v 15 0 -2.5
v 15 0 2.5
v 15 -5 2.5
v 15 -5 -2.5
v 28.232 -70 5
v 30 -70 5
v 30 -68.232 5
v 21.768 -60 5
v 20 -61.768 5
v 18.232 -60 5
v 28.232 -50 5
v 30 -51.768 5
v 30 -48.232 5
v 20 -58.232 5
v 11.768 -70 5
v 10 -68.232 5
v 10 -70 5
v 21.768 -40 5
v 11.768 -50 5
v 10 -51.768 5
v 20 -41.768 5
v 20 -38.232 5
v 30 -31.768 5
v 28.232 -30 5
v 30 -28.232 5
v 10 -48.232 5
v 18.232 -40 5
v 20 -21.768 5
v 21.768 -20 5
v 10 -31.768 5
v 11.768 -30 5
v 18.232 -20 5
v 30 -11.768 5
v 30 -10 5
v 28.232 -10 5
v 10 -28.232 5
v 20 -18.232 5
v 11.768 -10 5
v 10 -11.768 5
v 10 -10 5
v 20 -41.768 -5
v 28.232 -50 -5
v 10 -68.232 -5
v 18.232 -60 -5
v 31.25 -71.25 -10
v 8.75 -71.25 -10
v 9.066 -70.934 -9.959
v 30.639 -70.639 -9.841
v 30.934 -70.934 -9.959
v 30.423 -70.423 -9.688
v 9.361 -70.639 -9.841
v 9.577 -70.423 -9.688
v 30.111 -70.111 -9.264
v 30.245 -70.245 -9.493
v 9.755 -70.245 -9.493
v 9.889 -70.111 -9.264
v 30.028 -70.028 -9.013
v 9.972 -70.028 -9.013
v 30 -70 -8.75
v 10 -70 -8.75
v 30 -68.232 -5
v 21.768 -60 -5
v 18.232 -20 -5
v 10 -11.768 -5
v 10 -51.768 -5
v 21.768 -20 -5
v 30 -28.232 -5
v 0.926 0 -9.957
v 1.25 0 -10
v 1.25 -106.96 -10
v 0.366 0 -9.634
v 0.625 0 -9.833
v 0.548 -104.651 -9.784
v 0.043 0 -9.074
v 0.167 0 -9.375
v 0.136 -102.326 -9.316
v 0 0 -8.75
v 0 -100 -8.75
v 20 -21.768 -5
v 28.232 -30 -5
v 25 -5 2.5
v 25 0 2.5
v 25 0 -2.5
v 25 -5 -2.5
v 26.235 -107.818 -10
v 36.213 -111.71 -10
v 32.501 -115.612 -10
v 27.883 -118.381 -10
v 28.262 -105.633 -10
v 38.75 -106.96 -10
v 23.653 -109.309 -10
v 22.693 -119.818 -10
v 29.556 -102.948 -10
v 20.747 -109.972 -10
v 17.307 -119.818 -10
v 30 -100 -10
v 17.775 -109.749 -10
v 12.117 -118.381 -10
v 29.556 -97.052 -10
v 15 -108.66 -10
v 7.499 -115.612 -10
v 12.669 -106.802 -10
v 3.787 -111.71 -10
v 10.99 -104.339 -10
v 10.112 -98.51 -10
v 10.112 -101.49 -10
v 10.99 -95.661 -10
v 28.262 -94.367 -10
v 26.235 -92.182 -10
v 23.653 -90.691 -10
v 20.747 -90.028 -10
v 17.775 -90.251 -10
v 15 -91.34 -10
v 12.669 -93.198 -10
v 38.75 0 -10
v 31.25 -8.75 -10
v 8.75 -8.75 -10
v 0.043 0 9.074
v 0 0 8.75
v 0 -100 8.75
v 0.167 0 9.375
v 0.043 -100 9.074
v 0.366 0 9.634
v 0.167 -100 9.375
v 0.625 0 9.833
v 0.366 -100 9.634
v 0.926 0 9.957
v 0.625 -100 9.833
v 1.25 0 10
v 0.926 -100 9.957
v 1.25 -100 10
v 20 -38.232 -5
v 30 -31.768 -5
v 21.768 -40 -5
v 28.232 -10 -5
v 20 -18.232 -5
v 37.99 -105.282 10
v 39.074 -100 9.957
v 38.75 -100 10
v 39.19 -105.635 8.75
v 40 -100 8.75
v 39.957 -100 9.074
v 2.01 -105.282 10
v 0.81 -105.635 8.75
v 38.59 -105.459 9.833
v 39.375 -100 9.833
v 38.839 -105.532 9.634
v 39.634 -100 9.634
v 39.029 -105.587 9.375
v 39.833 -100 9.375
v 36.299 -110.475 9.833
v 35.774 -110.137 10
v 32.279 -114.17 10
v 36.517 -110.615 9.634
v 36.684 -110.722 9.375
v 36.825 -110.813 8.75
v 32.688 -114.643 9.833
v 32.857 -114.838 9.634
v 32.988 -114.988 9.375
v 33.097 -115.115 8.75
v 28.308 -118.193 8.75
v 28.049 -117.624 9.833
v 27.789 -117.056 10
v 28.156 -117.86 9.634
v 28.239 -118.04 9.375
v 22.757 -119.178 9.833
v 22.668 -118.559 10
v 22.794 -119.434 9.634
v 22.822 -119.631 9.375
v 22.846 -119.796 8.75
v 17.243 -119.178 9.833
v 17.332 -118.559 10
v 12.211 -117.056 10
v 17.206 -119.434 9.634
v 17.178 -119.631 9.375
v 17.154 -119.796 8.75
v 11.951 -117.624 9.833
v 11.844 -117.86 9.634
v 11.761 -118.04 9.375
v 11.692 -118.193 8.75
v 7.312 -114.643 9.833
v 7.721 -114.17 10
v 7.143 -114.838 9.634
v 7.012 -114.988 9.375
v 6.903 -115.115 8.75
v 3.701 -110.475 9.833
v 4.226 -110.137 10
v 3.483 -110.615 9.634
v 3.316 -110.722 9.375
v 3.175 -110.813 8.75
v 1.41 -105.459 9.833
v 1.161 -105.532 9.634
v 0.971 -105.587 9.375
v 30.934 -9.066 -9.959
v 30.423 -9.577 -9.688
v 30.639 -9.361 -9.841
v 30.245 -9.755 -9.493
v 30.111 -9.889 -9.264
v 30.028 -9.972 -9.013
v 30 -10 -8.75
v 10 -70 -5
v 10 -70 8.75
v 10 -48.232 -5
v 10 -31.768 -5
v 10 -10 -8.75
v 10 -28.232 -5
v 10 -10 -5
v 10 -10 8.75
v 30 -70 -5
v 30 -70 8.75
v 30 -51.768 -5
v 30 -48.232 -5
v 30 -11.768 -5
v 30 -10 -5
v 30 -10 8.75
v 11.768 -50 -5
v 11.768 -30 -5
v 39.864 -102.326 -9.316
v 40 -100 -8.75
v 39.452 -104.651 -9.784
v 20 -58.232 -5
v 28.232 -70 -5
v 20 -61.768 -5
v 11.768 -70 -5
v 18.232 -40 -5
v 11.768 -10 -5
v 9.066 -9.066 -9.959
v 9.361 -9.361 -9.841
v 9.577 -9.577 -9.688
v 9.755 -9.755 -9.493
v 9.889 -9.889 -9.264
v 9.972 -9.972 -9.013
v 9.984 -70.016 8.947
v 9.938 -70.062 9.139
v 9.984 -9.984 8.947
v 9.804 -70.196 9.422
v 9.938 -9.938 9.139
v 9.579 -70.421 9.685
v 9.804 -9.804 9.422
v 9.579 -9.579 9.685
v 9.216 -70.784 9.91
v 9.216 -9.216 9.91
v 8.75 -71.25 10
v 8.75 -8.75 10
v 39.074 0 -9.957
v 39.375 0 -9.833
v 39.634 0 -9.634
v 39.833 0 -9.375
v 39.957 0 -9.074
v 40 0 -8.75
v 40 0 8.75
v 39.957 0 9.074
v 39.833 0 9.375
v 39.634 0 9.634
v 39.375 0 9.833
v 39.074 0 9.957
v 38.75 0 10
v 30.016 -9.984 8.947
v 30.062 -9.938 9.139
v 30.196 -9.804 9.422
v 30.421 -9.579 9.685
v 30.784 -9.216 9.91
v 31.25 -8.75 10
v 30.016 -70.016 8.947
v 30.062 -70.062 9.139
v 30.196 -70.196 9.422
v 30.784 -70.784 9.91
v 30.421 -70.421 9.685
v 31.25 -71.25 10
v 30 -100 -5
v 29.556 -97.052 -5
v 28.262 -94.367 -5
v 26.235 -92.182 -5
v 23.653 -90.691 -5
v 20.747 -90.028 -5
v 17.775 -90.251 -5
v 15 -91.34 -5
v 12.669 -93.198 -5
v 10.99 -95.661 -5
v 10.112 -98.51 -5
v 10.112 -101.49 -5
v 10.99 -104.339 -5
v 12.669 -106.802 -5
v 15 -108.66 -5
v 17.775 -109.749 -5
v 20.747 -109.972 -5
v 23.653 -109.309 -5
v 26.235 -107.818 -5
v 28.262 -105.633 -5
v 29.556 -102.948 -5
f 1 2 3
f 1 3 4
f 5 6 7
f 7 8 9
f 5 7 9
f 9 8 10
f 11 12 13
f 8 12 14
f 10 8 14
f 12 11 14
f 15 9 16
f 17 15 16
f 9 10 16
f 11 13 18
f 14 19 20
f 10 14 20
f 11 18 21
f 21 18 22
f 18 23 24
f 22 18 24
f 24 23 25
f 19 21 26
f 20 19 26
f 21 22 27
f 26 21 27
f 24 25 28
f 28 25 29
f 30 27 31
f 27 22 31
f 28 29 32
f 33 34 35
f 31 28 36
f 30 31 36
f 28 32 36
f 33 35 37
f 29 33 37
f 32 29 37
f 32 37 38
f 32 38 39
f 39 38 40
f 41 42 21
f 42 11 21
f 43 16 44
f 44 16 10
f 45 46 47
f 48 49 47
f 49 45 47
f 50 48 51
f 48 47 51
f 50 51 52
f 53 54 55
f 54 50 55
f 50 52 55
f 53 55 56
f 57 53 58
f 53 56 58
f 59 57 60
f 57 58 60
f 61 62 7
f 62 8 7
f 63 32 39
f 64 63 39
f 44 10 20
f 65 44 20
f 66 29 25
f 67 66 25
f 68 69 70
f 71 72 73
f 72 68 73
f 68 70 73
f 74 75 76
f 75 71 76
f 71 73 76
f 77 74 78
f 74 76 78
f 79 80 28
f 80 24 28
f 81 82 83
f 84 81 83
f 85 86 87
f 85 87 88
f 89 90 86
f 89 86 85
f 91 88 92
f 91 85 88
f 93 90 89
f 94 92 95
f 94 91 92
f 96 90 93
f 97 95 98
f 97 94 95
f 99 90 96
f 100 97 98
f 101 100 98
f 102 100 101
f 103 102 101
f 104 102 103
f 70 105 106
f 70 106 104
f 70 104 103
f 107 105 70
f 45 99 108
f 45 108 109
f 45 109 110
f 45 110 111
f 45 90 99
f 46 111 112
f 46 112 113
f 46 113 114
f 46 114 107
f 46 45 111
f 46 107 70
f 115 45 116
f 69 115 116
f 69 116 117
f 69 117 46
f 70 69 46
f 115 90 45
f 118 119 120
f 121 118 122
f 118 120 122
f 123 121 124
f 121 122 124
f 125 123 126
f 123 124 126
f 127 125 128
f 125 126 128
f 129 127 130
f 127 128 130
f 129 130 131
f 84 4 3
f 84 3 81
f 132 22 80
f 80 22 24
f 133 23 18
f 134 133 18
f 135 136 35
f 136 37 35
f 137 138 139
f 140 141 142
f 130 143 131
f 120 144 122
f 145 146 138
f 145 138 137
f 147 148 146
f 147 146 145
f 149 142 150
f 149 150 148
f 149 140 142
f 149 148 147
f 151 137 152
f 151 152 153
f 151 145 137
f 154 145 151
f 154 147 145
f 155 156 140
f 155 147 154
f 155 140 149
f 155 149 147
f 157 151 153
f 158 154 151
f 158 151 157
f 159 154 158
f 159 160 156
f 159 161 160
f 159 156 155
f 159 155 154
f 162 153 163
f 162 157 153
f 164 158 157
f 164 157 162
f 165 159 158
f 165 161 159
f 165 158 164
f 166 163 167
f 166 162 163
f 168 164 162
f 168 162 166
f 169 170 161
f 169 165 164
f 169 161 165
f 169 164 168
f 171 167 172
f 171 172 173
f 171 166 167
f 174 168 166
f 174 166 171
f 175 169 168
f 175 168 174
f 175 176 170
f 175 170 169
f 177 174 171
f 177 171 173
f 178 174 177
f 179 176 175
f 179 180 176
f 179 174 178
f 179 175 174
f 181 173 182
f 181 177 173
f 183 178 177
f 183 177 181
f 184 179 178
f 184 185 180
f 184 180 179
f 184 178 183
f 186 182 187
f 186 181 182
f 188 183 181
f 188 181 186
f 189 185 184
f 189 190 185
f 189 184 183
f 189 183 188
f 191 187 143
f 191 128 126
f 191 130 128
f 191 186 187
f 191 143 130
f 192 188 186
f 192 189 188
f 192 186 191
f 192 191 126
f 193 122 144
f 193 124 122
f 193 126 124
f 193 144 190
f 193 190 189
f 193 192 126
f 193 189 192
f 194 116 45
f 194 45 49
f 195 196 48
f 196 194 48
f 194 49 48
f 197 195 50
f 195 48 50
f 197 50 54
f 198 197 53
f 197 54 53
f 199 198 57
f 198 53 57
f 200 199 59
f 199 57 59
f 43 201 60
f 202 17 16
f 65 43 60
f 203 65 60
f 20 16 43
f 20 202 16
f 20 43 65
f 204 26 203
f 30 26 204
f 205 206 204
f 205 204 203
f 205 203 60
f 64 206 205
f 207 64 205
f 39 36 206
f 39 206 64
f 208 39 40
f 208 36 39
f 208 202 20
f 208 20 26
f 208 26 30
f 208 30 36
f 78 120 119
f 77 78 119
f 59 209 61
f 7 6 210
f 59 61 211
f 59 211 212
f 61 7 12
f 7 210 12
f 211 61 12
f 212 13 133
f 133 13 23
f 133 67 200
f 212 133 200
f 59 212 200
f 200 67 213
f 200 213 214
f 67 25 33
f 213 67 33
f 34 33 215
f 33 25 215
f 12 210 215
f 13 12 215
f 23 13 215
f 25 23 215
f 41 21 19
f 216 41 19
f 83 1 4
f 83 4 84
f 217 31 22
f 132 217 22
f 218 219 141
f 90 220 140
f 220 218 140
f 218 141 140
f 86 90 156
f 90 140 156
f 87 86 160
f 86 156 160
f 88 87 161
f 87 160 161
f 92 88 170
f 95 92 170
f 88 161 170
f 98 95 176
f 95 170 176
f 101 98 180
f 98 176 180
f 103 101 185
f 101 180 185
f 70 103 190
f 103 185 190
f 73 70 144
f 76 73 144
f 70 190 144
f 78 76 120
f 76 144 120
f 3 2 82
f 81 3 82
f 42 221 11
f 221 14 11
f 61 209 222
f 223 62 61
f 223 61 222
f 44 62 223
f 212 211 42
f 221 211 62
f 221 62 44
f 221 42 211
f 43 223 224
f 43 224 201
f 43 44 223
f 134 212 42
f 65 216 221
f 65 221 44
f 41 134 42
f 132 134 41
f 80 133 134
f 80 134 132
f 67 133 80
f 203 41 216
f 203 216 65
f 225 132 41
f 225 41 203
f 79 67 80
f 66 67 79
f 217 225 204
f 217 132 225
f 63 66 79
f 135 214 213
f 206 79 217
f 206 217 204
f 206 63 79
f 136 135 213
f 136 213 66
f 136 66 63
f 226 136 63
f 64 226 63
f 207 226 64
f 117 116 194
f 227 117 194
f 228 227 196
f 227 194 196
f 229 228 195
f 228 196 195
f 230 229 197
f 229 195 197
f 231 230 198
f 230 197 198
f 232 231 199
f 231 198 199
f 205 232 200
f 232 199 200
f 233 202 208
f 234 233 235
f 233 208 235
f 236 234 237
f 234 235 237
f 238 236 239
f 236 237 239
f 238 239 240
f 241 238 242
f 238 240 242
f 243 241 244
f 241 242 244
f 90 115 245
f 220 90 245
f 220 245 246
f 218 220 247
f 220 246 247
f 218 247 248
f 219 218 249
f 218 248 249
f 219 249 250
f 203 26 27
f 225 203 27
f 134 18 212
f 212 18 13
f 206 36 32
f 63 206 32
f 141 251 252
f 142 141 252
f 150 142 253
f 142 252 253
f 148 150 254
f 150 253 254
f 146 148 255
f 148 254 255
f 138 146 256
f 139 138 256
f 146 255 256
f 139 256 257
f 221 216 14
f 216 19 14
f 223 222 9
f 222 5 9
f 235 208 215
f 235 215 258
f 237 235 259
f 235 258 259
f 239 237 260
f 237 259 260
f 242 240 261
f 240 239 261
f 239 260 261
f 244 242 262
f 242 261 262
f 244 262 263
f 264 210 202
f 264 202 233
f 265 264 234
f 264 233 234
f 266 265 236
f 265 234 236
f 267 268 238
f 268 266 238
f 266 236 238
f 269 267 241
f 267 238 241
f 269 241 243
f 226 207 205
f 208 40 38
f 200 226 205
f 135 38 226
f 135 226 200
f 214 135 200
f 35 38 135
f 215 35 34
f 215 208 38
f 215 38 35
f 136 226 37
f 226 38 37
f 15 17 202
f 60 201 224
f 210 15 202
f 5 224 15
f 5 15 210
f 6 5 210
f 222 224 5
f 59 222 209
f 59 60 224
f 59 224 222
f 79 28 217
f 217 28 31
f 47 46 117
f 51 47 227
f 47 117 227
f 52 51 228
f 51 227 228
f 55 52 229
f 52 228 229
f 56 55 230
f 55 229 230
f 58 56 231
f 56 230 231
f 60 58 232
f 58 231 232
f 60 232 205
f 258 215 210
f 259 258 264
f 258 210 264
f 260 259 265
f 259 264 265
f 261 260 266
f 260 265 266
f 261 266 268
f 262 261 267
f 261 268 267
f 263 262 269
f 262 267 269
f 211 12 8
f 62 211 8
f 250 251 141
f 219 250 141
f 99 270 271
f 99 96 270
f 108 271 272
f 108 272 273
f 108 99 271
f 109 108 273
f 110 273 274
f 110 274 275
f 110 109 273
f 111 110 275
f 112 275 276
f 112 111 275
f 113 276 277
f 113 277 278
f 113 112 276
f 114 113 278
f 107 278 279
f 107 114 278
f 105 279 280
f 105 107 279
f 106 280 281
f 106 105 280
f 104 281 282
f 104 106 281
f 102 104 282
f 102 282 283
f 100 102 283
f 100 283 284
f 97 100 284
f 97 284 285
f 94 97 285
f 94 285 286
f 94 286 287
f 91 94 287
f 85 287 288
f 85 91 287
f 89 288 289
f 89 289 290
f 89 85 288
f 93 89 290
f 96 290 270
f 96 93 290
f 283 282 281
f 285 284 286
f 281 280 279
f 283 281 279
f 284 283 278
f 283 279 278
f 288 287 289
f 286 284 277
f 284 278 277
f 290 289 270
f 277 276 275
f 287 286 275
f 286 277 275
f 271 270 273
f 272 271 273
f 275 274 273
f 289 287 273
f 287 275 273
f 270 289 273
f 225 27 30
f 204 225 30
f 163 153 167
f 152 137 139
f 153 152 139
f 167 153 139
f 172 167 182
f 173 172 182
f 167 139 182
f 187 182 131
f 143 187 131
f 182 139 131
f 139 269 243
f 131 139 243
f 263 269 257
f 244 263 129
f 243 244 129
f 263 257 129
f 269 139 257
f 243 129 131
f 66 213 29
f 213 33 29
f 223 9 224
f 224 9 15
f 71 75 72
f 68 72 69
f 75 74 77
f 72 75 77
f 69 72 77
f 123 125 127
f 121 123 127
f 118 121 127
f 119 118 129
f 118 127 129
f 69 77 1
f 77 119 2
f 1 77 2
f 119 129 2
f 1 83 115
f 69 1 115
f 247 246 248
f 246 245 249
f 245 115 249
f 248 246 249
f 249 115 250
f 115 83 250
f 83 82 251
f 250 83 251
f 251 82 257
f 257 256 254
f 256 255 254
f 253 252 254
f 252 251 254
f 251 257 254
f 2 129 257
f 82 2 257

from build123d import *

# Parameters (mm, degrees)
SKETCH1_R                = 10
SKETCH1_W                = 20
SKETCH1_H                = 60
BOSS_EXTRUDE1_DEPTH      = 10
BOSS_EXTRUDE2_DEPTH      = 10
BOSS_EXTRUDE2_DEPTH_BACK = 5
SKETCH1_3_R              = 10
SKETCH3_W                = 10
SKETCH3_H                = 5
CUT_EXTRUDE1_DEPTH       = 5
BOSS_EXTRUDE3_DEPTH      = 5
FILLET1_R                = 1.25


with BuildPart() as part:
    # Sketch1 → Boss-Extrude1 (new, symmetric)
    with BuildSketch(Plane.XY):
        with BuildLine():
            Line((0, 0), (40, 0))
            Line((40, 0), (40, -100))
            ThreePointArc((40, -100), (20, -120), (0, -100))
            Line((0, -100), (0, 0))
        make_face()
        with Locations((20, -100)):
            Circle(SKETCH1_R, mode=Mode.SUBTRACT)
        with Locations((20, -40)):
            Rectangle(SKETCH1_W, SKETCH1_H, mode=Mode.SUBTRACT)
    extrude(amount=BOSS_EXTRUDE1_DEPTH, both=True)

    # Sketch1<3> → Boss-Extrude2 (add, two sides: drawn at the far end of the back side and taken through both)
    with BuildSketch(Plane.XY.offset(-BOSS_EXTRUDE2_DEPTH_BACK)):
        with Locations((20, -100)):
            Circle(SKETCH1_3_R)
    extrude(amount=BOSS_EXTRUDE2_DEPTH + BOSS_EXTRUDE2_DEPTH_BACK)

    # Sketch3 → Cut-Extrude1 (cut)
    with BuildSketch(Plane(origin=(0, 0, 0), x_dir=(1, 0, 0), z_dir=(0, 1, 0))):
        with Locations((20, 0)):
            Rectangle(SKETCH3_W, SKETCH3_H)
    extrude(amount=-CUT_EXTRUDE1_DEPTH, mode=Mode.SUBTRACT)

    # Sketch4 → Boss-Extrude3 (add, symmetric)
    with BuildSketch(Plane.XY):
        Polygon((11.767766953, -10), (31.767766953, -30), (11.767766953, -50), (30, -68.232233047), (30, -70), (28.232233047, -70), (8.232233047, -50), (28.232233047, -30), (10, -11.767766953), (10, -10), align=None)
        Polygon((11.767766953, -70), (10, -70), (10, -68.232233047), (28.232233047, -50), (8.232233047, -30), (28.232233047, -10), (30, -10), (30, -11.767766953), (11.767766953, -30), (31.767766953, -50), align=None)
    extrude(amount=BOSS_EXTRUDE3_DEPTH, both=True)

    # Fillet1
    # the kernel refuses this fillet: 1.25 mm, written as the material it takes off along each edge
    with BuildSketch(Plane(origin=(40, 3.125, 10), x_dir=(-1, 0, 0), z_dir=(0, -1, 0))) as fillet1_piece_1:
        with BuildLine():
            CenterArc((FILLET1_R, FILLET1_R), FILLET1_R, 180, 90)
            Line((0, FILLET1_R), (0, 0))
            Line((0, 0), (FILLET1_R, 0))
        make_face()
    extrude(amount=103.125, mode=Mode.SUBTRACT)
    with BuildSketch(Plane(origin=(30, -10, -10), x_dir=(0, 1, 0), z_dir=(-1, 0, 0)), Plane(origin=(10, -70, -10), x_dir=(0, -1, 0), z_dir=(1, 0, 0))) as fillet1_piece_2:
        with BuildLine():
            CenterArc((FILLET1_R, -FILLET1_R), FILLET1_R, 90, 90)
            Line((0, -FILLET1_R), (0, 0))
            Line((0, 0), (FILLET1_R, 0))
        make_face()
    extrude(amount=20, mode=Mode.SUBTRACT)
    with BuildSketch(Plane(origin=(10, -10, -10), x_dir=(-1, 0, 0), z_dir=(0, -1, 0)), Plane(origin=(30, -70, -10), x_dir=(1, 0, 0), z_dir=(0, 1, 0))) as fillet1_piece_3:
        with BuildLine():
            CenterArc((FILLET1_R, -FILLET1_R), FILLET1_R, 90, 90)
            Line((0, -FILLET1_R), (0, 0))
            Line((0, 0), (FILLET1_R, 0))
        make_face()
    extrude(amount=60, mode=Mode.SUBTRACT)
    with BuildSketch(Plane(origin=(30, -10, 10), x_dir=(0, 1, 0), z_dir=(-1, 0, 0)), Plane(origin=(10, -70, 10), x_dir=(0, -1, 0), z_dir=(1, 0, 0))) as fillet1_piece_4:
        with BuildLine():
            CenterArc((FILLET1_R, FILLET1_R), FILLET1_R, 180, 90)
            Line((0, FILLET1_R), (0, 0))
            Line((0, 0), (FILLET1_R, 0))
        make_face()
    extrude(amount=20, mode=Mode.SUBTRACT)
    with BuildSketch(Plane(origin=(10, -10, 10), x_dir=(-1, 0, 0), z_dir=(0, -1, 0)), Plane(origin=(30, -70, 10), x_dir=(1, 0, 0), z_dir=(0, 1, 0))) as fillet1_piece_5:
        with BuildLine():
            CenterArc((FILLET1_R, FILLET1_R), FILLET1_R, 180, 90)
            Line((0, FILLET1_R), (0, 0))
            Line((0, 0), (FILLET1_R, 0))
        make_face()
    extrude(amount=60, mode=Mode.SUBTRACT)
    with BuildSketch(Plane(origin=(0, -100, 10), x_dir=(0, 0, -1), z_dir=(0, 1, 0))) as fillet1_piece_6:
        with BuildLine():
            CenterArc((FILLET1_R, -FILLET1_R), FILLET1_R, 90, 90)
            Line((0, -FILLET1_R), (0, 0))
            Line((0, 0), (FILLET1_R, 0))
        make_face()
    extrude(amount=103.125, mode=Mode.SUBTRACT)
    with BuildSketch(Plane(origin=(40, 3.125, -10), x_dir=(-1, 0, 0), z_dir=(0, -1, 0))) as fillet1_piece_7:
        with BuildLine():
            CenterArc((FILLET1_R, -FILLET1_R), FILLET1_R, 90, 90)
            Line((0, -FILLET1_R), (0, 0))
            Line((0, 0), (FILLET1_R, 0))
        make_face()
    extrude(amount=112.5, mode=Mode.SUBTRACT)
    with BuildSketch(Plane(origin=(0, -109.375, -10), x_dir=(0, 0, 1), z_dir=(0, 1, 0))) as fillet1_piece_8:
        with BuildLine():
            CenterArc((FILLET1_R, FILLET1_R), FILLET1_R, 180, 90)
            Line((0, FILLET1_R), (0, 0))
            Line((0, 0), (FILLET1_R, 0))
        make_face()
    extrude(amount=112.5, mode=Mode.SUBTRACT)
    with BuildSketch(Plane(origin=(20, -100, 10), x_dir=(1, 0, 0), z_dir=(0, 1, 0))) as fillet1_piece_9:
        with BuildLine():
            CenterArc((20 - FILLET1_R, FILLET1_R), FILLET1_R, 270, 90)
            Line((20 - FILLET1_R, 0), (20, 0))
            Line((20, 0), (20, FILLET1_R))
        make_face()
    revolve(axis=Axis((20, -100, 10), (0, 0, -1)), revolution_arc=180, mode=Mode.SUBTRACT)
    with BuildSketch(Plane(origin=(30, -70, -10), x_dir=(1, 0, 0), z_dir=(0, 1, 0))) as fillet1_piece_10a_section:
        with BuildLine():
            CenterArc((FILLET1_R, -FILLET1_R), FILLET1_R, 90, 90)
            Line((0, -FILLET1_R), (0, 0))
            Line((0, 0), (FILLET1_R, 0))
        make_face()
    fillet1_piece_10a = extrude(amount=63.125, mode=Mode.PRIVATE)
    fillet1_piece_10a = split(fillet1_piece_10a, bisect_by=Plane(origin=(30, -10, -10), z_dir=(0, 1, 0)), keep=Keep.TOP, mode=Mode.PRIVATE)
    with BuildSketch(Plane(origin=(33.125, -10, -10), x_dir=(0, 1, 0), z_dir=(-1, 0, 0))) as fillet1_piece_10b_section:
        with BuildLine():
            CenterArc((FILLET1_R, -FILLET1_R), FILLET1_R, 90, 90)
            Line((0, -FILLET1_R), (0, 0))
            Line((0, 0), (FILLET1_R, 0))
        make_face()
    fillet1_piece_10b = extrude(amount=23.125, mode=Mode.PRIVATE)
    fillet1_piece_10b = split(fillet1_piece_10b, bisect_by=Plane(origin=(30, -10, -10), z_dir=(1, 0, 0)), keep=Keep.TOP, mode=Mode.PRIVATE)
    fillet1_piece_10 = fillet1_piece_10a & fillet1_piece_10b
    add(fillet1_piece_10, mode=Mode.SUBTRACT)
    with BuildSketch(Plane(origin=(10, -6.875, -10), x_dir=(-1, 0, 0), z_dir=(0, -1, 0))) as fillet1_piece_11a_section:
        with BuildLine():
            CenterArc((FILLET1_R, -FILLET1_R), FILLET1_R, 90, 90)
            Line((0, -FILLET1_R), (0, 0))
            Line((0, 0), (FILLET1_R, 0))
        make_face()
    fillet1_piece_11a = extrude(amount=63.125, mode=Mode.PRIVATE)
    fillet1_piece_11a = split(fillet1_piece_11a, bisect_by=Plane(origin=(10, -10, -10), z_dir=(0, 1, 0)), keep=Keep.TOP, mode=Mode.PRIVATE)
    with BuildSketch(Plane(origin=(30, -10, -10), x_dir=(0, 1, 0), z_dir=(-1, 0, 0))) as fillet1_piece_11b_section:
        with BuildLine():
            CenterArc((FILLET1_R, -FILLET1_R), FILLET1_R, 90, 90)
            Line((0, -FILLET1_R), (0, 0))
            Line((0, 0), (FILLET1_R, 0))
        make_face()
    fillet1_piece_11b = extrude(amount=23.125, mode=Mode.PRIVATE)
    fillet1_piece_11b = split(fillet1_piece_11b, bisect_by=Plane(origin=(10, -10, -10), z_dir=(-1, 0, 0)), keep=Keep.TOP, mode=Mode.PRIVATE)
    fillet1_piece_11 = fillet1_piece_11a & fillet1_piece_11b
    add(fillet1_piece_11, mode=Mode.SUBTRACT)
    with BuildSketch(Plane(origin=(10, -10, -10), x_dir=(-1, 0, 0), z_dir=(0, -1, 0))) as fillet1_piece_12a_section:
        with BuildLine():
            CenterArc((FILLET1_R, -FILLET1_R), FILLET1_R, 90, 90)
            Line((0, -FILLET1_R), (0, 0))
            Line((0, 0), (FILLET1_R, 0))
        make_face()
    fillet1_piece_12a = extrude(amount=63.125, mode=Mode.PRIVATE)
    fillet1_piece_12a = split(fillet1_piece_12a, bisect_by=Plane(origin=(10, -70, -10), z_dir=(0, -1, 0)), keep=Keep.TOP, mode=Mode.PRIVATE)
    with BuildSketch(Plane(origin=(6.875, -70, -10), x_dir=(0, -1, 0), z_dir=(1, 0, 0))) as fillet1_piece_12b_section:
        with BuildLine():
            CenterArc((FILLET1_R, -FILLET1_R), FILLET1_R, 90, 90)
            Line((0, -FILLET1_R), (0, 0))
            Line((0, 0), (FILLET1_R, 0))
        make_face()
    fillet1_piece_12b = extrude(amount=23.125, mode=Mode.PRIVATE)
    fillet1_piece_12b = split(fillet1_piece_12b, bisect_by=Plane(origin=(10, -70, -10), z_dir=(-1, 0, 0)), keep=Keep.TOP, mode=Mode.PRIVATE)
    fillet1_piece_12 = fillet1_piece_12a & fillet1_piece_12b
    add(fillet1_piece_12, mode=Mode.SUBTRACT)
    with BuildSketch(Plane(origin=(10, -70, -10), x_dir=(0, -1, 0), z_dir=(1, 0, 0))) as fillet1_piece_13a_section:
        with BuildLine():
            CenterArc((FILLET1_R, -FILLET1_R), FILLET1_R, 90, 90)
            Line((0, -FILLET1_R), (0, 0))
            Line((0, 0), (FILLET1_R, 0))
        make_face()
    fillet1_piece_13a = extrude(amount=23.125, mode=Mode.PRIVATE)
    fillet1_piece_13a = split(fillet1_piece_13a, bisect_by=Plane(origin=(30, -70, -10), z_dir=(1, 0, 0)), keep=Keep.TOP, mode=Mode.PRIVATE)
    with BuildSketch(Plane(origin=(30, -73.125, -10), x_dir=(1, 0, 0), z_dir=(0, 1, 0))) as fillet1_piece_13b_section:
        with BuildLine():
            CenterArc((FILLET1_R, -FILLET1_R), FILLET1_R, 90, 90)
            Line((0, -FILLET1_R), (0, 0))
            Line((0, 0), (FILLET1_R, 0))
        make_face()
    fillet1_piece_13b = extrude(amount=63.125, mode=Mode.PRIVATE)
    fillet1_piece_13b = split(fillet1_piece_13b, bisect_by=Plane(origin=(30, -70, -10), z_dir=(0, -1, 0)), keep=Keep.TOP, mode=Mode.PRIVATE)
    fillet1_piece_13 = fillet1_piece_13a & fillet1_piece_13b
    add(fillet1_piece_13, mode=Mode.SUBTRACT)
    with BuildSketch(Plane(origin=(30, -70, 10), x_dir=(1, 0, 0), z_dir=(0, 1, 0))) as fillet1_piece_14a_section:
        with BuildLine():
            CenterArc((FILLET1_R, FILLET1_R), FILLET1_R, 180, 90)
            Line((0, FILLET1_R), (0, 0))
            Line((0, 0), (FILLET1_R, 0))
        make_face()
    fillet1_piece_14a = extrude(amount=63.125, mode=Mode.PRIVATE)
    fillet1_piece_14a = split(fillet1_piece_14a, bisect_by=Plane(origin=(30, -10, 10), z_dir=(0, 1, 0)), keep=Keep.TOP, mode=Mode.PRIVATE)
    with BuildSketch(Plane(origin=(33.125, -10, 10), x_dir=(0, 1, 0), z_dir=(-1, 0, 0))) as fillet1_piece_14b_section:
        with BuildLine():
            CenterArc((FILLET1_R, FILLET1_R), FILLET1_R, 180, 90)
            Line((0, FILLET1_R), (0, 0))
            Line((0, 0), (FILLET1_R, 0))
        make_face()
    fillet1_piece_14b = extrude(amount=23.125, mode=Mode.PRIVATE)
    fillet1_piece_14b = split(fillet1_piece_14b, bisect_by=Plane(origin=(30, -10, 10), z_dir=(1, 0, 0)), keep=Keep.TOP, mode=Mode.PRIVATE)
    fillet1_piece_14 = fillet1_piece_14a & fillet1_piece_14b
    add(fillet1_piece_14, mode=Mode.SUBTRACT)
    with BuildSketch(Plane(origin=(10, -6.875, 10), x_dir=(-1, 0, 0), z_dir=(0, -1, 0))) as fillet1_piece_15a_section:
        with BuildLine():
            CenterArc((FILLET1_R, FILLET1_R), FILLET1_R, 180, 90)
            Line((0, FILLET1_R), (0, 0))
            Line((0, 0), (FILLET1_R, 0))
        make_face()
    fillet1_piece_15a = extrude(amount=63.125, mode=Mode.PRIVATE)
    fillet1_piece_15a = split(fillet1_piece_15a, bisect_by=Plane(origin=(10, -10, 10), z_dir=(0, 1, 0)), keep=Keep.TOP, mode=Mode.PRIVATE)
    with BuildSketch(Plane(origin=(30, -10, 10), x_dir=(0, 1, 0), z_dir=(-1, 0, 0))) as fillet1_piece_15b_section:
        with BuildLine():
            CenterArc((FILLET1_R, FILLET1_R), FILLET1_R, 180, 90)
            Line((0, FILLET1_R), (0, 0))
            Line((0, 0), (FILLET1_R, 0))
        make_face()
    fillet1_piece_15b = extrude(amount=23.125, mode=Mode.PRIVATE)
    fillet1_piece_15b = split(fillet1_piece_15b, bisect_by=Plane(origin=(10, -10, 10), z_dir=(-1, 0, 0)), keep=Keep.TOP, mode=Mode.PRIVATE)
    fillet1_piece_15 = fillet1_piece_15a & fillet1_piece_15b
    add(fillet1_piece_15, mode=Mode.SUBTRACT)
    with BuildSketch(Plane(origin=(10, -10, 10), x_dir=(-1, 0, 0), z_dir=(0, -1, 0))) as fillet1_piece_16a_section:
        with BuildLine():
            CenterArc((FILLET1_R, FILLET1_R), FILLET1_R, 180, 90)
            Line((0, FILLET1_R), (0, 0))
            Line((0, 0), (FILLET1_R, 0))
        make_face()
    fillet1_piece_16a = extrude(amount=63.125, mode=Mode.PRIVATE)
    fillet1_piece_16a = split(fillet1_piece_16a, bisect_by=Plane(origin=(10, -70, 10), z_dir=(0, -1, 0)), keep=Keep.TOP, mode=Mode.PRIVATE)
    with BuildSketch(Plane(origin=(6.875, -70, 10), x_dir=(0, -1, 0), z_dir=(1, 0, 0))) as fillet1_piece_16b_section:
        with BuildLine():
            CenterArc((FILLET1_R, FILLET1_R), FILLET1_R, 180, 90)
            Line((0, FILLET1_R), (0, 0))
            Line((0, 0), (FILLET1_R, 0))
        make_face()
    fillet1_piece_16b = extrude(amount=23.125, mode=Mode.PRIVATE)
    fillet1_piece_16b = split(fillet1_piece_16b, bisect_by=Plane(origin=(10, -70, 10), z_dir=(-1, 0, 0)), keep=Keep.TOP, mode=Mode.PRIVATE)
    fillet1_piece_16 = fillet1_piece_16a & fillet1_piece_16b
    add(fillet1_piece_16, mode=Mode.SUBTRACT)
    with BuildSketch(Plane(origin=(10, -70, 10), x_dir=(0, -1, 0), z_dir=(1, 0, 0))) as fillet1_piece_17a_section:
        with BuildLine():
            CenterArc((FILLET1_R, FILLET1_R), FILLET1_R, 180, 90)
            Line((0, FILLET1_R), (0, 0))
            Line((0, 0), (FILLET1_R, 0))
        make_face()
    fillet1_piece_17a = extrude(amount=23.125, mode=Mode.PRIVATE)
    fillet1_piece_17a = split(fillet1_piece_17a, bisect_by=Plane(origin=(30, -70, 10), z_dir=(1, 0, 0)), keep=Keep.TOP, mode=Mode.PRIVATE)
    with BuildSketch(Plane(origin=(30, -73.125, 10), x_dir=(1, 0, 0), z_dir=(0, 1, 0))) as fillet1_piece_17b_section:
        with BuildLine():
            CenterArc((FILLET1_R, FILLET1_R), FILLET1_R, 180, 90)
            Line((0, FILLET1_R), (0, 0))
            Line((0, 0), (FILLET1_R, 0))
        make_face()
    fillet1_piece_17b = extrude(amount=63.125, mode=Mode.PRIVATE)
    fillet1_piece_17b = split(fillet1_piece_17b, bisect_by=Plane(origin=(30, -70, 10), z_dir=(0, -1, 0)), keep=Keep.TOP, mode=Mode.PRIVATE)
    fillet1_piece_17 = fillet1_piece_17a & fillet1_piece_17b
    add(fillet1_piece_17, mode=Mode.SUBTRACT)


solid = part.part
